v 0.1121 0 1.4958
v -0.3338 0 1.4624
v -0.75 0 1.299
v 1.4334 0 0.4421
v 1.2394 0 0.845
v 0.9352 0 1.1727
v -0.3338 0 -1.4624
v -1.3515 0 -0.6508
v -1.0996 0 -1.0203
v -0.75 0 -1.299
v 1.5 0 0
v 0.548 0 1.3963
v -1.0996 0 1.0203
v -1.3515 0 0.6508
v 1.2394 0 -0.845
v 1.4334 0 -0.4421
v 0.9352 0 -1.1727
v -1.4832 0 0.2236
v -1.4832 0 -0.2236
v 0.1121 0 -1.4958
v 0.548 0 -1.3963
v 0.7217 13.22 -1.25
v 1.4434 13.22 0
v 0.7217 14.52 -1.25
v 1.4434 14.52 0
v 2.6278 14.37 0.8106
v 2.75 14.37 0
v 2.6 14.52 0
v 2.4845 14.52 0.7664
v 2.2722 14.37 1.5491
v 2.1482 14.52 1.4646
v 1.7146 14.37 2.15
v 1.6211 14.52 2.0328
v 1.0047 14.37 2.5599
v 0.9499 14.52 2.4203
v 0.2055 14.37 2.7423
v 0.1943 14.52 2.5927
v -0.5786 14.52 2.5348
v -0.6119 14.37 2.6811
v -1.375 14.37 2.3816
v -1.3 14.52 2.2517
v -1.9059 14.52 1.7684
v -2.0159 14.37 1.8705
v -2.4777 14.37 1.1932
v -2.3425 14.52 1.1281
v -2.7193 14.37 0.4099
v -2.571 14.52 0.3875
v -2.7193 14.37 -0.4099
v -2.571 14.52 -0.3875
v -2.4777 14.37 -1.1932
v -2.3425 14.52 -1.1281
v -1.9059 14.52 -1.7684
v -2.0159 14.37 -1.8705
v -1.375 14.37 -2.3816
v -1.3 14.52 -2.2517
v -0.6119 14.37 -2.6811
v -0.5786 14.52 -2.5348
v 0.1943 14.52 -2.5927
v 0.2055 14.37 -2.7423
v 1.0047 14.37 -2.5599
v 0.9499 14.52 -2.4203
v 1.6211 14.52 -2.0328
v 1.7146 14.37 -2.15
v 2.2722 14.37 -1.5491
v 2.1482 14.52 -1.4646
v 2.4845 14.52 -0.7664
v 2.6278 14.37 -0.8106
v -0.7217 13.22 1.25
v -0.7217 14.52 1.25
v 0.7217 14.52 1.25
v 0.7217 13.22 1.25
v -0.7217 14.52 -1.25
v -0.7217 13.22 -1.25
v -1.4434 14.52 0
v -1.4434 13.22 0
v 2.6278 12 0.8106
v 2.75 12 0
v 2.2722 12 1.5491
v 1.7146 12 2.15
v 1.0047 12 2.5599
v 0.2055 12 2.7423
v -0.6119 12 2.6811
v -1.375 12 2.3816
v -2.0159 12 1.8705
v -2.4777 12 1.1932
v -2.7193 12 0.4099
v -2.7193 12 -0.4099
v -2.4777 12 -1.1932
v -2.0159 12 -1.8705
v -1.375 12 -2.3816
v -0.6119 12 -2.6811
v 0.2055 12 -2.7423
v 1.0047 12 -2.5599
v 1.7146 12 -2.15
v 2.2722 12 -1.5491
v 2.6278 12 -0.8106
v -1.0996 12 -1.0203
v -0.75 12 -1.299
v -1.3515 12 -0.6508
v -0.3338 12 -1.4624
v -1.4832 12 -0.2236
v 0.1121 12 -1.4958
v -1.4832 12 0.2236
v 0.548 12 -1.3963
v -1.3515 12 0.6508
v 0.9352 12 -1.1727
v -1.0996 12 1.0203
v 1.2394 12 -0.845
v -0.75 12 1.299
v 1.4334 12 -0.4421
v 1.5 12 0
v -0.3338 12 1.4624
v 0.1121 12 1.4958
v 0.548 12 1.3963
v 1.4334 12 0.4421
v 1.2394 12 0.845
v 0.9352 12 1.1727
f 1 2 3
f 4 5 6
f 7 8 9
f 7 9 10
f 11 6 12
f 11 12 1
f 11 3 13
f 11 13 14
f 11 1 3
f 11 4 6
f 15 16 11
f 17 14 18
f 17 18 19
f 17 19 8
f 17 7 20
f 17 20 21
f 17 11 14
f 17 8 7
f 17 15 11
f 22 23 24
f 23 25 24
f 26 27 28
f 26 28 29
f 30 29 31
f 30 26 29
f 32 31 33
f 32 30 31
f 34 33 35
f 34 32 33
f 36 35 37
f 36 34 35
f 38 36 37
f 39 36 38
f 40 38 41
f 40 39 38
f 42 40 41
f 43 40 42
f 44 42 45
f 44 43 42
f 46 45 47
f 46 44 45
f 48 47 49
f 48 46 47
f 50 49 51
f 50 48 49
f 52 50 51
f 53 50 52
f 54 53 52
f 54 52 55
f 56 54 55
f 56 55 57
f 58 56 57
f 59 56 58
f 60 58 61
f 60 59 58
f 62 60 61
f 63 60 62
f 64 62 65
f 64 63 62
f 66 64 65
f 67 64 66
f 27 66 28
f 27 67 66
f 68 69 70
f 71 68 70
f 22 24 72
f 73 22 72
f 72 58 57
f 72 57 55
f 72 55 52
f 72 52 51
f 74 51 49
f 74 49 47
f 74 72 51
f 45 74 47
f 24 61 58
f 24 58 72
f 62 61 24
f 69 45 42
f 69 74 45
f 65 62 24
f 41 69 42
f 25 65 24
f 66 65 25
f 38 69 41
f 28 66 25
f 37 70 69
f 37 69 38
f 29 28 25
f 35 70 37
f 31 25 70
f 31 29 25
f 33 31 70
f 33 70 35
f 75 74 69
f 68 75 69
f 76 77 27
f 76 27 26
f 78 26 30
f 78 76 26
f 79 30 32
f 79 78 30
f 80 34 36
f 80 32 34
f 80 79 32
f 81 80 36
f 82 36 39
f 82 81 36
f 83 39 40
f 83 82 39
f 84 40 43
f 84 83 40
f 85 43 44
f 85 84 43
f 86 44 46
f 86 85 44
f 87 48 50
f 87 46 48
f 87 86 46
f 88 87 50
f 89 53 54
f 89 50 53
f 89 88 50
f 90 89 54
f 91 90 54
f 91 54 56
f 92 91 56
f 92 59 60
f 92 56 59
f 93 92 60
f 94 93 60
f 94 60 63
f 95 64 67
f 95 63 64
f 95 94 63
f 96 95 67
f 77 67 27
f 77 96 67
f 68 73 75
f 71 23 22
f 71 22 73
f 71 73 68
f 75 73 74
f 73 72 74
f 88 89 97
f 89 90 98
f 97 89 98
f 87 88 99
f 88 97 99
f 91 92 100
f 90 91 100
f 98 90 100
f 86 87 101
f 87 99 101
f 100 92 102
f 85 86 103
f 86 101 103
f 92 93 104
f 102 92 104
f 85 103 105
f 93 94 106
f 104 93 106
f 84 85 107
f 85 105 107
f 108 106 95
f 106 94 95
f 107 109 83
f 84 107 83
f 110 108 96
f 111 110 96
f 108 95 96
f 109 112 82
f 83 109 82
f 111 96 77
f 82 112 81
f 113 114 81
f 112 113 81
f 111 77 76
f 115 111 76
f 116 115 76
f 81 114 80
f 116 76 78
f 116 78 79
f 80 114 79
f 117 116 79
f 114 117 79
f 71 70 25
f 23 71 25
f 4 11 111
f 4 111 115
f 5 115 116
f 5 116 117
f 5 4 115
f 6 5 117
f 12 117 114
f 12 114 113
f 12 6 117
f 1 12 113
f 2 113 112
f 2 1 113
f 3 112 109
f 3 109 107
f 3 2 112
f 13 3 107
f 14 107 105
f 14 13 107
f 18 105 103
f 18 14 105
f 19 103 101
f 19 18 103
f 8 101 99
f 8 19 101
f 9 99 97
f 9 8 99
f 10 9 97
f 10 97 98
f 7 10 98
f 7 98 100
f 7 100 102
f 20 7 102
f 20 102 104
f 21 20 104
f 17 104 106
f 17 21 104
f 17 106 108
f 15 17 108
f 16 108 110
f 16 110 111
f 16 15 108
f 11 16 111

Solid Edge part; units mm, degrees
sketch "Sketch1" plane through (0, 0, 0) normal (0, -1, 0) x (1, 0, 0)
  circle A0 centre (0, 0) radius 1.5
extrude "Protrusion1" add sketch "Sketch1" against normal blind 12
sketch "Sketch2" plane through (0, 12, 0) normal (0, 1, 0) x (1, 0, 0)
  circle A0 centre (0, 0) radius 2.75
extrude "ExtrudedProtrusion_2" add sketch "Sketch2" along normal blind 2.52
sketch "Sketch3" plane through (0, 14.52, 0) normal (0, 1, 0) x (-1, 0, 0)
  line L0 (0.7217, 1.25) -> (-0.7217, 1.25)
  line L1 (-0.7217, 1.25) -> (-1.4434, 0)
  line L2 (-1.4434, 0) -> (-0.7217, -1.25)
  line L3 (-0.7217, -1.25) -> (0.7217, -1.25)
  line L4 (0.7217, -1.25) -> (1.4434, 0)
  line L5 (1.4434, 0) -> (0.7217, 1.25)
  dimension "D1" = 2.5
extrude "Cutout1" cut sketch "Sketch3" against normal blind 1.3
chamfer "Chamfer1" distance 0.15 angle 45 1 edges at (-2.75, 14.52, 0)
properties material "Steel"
